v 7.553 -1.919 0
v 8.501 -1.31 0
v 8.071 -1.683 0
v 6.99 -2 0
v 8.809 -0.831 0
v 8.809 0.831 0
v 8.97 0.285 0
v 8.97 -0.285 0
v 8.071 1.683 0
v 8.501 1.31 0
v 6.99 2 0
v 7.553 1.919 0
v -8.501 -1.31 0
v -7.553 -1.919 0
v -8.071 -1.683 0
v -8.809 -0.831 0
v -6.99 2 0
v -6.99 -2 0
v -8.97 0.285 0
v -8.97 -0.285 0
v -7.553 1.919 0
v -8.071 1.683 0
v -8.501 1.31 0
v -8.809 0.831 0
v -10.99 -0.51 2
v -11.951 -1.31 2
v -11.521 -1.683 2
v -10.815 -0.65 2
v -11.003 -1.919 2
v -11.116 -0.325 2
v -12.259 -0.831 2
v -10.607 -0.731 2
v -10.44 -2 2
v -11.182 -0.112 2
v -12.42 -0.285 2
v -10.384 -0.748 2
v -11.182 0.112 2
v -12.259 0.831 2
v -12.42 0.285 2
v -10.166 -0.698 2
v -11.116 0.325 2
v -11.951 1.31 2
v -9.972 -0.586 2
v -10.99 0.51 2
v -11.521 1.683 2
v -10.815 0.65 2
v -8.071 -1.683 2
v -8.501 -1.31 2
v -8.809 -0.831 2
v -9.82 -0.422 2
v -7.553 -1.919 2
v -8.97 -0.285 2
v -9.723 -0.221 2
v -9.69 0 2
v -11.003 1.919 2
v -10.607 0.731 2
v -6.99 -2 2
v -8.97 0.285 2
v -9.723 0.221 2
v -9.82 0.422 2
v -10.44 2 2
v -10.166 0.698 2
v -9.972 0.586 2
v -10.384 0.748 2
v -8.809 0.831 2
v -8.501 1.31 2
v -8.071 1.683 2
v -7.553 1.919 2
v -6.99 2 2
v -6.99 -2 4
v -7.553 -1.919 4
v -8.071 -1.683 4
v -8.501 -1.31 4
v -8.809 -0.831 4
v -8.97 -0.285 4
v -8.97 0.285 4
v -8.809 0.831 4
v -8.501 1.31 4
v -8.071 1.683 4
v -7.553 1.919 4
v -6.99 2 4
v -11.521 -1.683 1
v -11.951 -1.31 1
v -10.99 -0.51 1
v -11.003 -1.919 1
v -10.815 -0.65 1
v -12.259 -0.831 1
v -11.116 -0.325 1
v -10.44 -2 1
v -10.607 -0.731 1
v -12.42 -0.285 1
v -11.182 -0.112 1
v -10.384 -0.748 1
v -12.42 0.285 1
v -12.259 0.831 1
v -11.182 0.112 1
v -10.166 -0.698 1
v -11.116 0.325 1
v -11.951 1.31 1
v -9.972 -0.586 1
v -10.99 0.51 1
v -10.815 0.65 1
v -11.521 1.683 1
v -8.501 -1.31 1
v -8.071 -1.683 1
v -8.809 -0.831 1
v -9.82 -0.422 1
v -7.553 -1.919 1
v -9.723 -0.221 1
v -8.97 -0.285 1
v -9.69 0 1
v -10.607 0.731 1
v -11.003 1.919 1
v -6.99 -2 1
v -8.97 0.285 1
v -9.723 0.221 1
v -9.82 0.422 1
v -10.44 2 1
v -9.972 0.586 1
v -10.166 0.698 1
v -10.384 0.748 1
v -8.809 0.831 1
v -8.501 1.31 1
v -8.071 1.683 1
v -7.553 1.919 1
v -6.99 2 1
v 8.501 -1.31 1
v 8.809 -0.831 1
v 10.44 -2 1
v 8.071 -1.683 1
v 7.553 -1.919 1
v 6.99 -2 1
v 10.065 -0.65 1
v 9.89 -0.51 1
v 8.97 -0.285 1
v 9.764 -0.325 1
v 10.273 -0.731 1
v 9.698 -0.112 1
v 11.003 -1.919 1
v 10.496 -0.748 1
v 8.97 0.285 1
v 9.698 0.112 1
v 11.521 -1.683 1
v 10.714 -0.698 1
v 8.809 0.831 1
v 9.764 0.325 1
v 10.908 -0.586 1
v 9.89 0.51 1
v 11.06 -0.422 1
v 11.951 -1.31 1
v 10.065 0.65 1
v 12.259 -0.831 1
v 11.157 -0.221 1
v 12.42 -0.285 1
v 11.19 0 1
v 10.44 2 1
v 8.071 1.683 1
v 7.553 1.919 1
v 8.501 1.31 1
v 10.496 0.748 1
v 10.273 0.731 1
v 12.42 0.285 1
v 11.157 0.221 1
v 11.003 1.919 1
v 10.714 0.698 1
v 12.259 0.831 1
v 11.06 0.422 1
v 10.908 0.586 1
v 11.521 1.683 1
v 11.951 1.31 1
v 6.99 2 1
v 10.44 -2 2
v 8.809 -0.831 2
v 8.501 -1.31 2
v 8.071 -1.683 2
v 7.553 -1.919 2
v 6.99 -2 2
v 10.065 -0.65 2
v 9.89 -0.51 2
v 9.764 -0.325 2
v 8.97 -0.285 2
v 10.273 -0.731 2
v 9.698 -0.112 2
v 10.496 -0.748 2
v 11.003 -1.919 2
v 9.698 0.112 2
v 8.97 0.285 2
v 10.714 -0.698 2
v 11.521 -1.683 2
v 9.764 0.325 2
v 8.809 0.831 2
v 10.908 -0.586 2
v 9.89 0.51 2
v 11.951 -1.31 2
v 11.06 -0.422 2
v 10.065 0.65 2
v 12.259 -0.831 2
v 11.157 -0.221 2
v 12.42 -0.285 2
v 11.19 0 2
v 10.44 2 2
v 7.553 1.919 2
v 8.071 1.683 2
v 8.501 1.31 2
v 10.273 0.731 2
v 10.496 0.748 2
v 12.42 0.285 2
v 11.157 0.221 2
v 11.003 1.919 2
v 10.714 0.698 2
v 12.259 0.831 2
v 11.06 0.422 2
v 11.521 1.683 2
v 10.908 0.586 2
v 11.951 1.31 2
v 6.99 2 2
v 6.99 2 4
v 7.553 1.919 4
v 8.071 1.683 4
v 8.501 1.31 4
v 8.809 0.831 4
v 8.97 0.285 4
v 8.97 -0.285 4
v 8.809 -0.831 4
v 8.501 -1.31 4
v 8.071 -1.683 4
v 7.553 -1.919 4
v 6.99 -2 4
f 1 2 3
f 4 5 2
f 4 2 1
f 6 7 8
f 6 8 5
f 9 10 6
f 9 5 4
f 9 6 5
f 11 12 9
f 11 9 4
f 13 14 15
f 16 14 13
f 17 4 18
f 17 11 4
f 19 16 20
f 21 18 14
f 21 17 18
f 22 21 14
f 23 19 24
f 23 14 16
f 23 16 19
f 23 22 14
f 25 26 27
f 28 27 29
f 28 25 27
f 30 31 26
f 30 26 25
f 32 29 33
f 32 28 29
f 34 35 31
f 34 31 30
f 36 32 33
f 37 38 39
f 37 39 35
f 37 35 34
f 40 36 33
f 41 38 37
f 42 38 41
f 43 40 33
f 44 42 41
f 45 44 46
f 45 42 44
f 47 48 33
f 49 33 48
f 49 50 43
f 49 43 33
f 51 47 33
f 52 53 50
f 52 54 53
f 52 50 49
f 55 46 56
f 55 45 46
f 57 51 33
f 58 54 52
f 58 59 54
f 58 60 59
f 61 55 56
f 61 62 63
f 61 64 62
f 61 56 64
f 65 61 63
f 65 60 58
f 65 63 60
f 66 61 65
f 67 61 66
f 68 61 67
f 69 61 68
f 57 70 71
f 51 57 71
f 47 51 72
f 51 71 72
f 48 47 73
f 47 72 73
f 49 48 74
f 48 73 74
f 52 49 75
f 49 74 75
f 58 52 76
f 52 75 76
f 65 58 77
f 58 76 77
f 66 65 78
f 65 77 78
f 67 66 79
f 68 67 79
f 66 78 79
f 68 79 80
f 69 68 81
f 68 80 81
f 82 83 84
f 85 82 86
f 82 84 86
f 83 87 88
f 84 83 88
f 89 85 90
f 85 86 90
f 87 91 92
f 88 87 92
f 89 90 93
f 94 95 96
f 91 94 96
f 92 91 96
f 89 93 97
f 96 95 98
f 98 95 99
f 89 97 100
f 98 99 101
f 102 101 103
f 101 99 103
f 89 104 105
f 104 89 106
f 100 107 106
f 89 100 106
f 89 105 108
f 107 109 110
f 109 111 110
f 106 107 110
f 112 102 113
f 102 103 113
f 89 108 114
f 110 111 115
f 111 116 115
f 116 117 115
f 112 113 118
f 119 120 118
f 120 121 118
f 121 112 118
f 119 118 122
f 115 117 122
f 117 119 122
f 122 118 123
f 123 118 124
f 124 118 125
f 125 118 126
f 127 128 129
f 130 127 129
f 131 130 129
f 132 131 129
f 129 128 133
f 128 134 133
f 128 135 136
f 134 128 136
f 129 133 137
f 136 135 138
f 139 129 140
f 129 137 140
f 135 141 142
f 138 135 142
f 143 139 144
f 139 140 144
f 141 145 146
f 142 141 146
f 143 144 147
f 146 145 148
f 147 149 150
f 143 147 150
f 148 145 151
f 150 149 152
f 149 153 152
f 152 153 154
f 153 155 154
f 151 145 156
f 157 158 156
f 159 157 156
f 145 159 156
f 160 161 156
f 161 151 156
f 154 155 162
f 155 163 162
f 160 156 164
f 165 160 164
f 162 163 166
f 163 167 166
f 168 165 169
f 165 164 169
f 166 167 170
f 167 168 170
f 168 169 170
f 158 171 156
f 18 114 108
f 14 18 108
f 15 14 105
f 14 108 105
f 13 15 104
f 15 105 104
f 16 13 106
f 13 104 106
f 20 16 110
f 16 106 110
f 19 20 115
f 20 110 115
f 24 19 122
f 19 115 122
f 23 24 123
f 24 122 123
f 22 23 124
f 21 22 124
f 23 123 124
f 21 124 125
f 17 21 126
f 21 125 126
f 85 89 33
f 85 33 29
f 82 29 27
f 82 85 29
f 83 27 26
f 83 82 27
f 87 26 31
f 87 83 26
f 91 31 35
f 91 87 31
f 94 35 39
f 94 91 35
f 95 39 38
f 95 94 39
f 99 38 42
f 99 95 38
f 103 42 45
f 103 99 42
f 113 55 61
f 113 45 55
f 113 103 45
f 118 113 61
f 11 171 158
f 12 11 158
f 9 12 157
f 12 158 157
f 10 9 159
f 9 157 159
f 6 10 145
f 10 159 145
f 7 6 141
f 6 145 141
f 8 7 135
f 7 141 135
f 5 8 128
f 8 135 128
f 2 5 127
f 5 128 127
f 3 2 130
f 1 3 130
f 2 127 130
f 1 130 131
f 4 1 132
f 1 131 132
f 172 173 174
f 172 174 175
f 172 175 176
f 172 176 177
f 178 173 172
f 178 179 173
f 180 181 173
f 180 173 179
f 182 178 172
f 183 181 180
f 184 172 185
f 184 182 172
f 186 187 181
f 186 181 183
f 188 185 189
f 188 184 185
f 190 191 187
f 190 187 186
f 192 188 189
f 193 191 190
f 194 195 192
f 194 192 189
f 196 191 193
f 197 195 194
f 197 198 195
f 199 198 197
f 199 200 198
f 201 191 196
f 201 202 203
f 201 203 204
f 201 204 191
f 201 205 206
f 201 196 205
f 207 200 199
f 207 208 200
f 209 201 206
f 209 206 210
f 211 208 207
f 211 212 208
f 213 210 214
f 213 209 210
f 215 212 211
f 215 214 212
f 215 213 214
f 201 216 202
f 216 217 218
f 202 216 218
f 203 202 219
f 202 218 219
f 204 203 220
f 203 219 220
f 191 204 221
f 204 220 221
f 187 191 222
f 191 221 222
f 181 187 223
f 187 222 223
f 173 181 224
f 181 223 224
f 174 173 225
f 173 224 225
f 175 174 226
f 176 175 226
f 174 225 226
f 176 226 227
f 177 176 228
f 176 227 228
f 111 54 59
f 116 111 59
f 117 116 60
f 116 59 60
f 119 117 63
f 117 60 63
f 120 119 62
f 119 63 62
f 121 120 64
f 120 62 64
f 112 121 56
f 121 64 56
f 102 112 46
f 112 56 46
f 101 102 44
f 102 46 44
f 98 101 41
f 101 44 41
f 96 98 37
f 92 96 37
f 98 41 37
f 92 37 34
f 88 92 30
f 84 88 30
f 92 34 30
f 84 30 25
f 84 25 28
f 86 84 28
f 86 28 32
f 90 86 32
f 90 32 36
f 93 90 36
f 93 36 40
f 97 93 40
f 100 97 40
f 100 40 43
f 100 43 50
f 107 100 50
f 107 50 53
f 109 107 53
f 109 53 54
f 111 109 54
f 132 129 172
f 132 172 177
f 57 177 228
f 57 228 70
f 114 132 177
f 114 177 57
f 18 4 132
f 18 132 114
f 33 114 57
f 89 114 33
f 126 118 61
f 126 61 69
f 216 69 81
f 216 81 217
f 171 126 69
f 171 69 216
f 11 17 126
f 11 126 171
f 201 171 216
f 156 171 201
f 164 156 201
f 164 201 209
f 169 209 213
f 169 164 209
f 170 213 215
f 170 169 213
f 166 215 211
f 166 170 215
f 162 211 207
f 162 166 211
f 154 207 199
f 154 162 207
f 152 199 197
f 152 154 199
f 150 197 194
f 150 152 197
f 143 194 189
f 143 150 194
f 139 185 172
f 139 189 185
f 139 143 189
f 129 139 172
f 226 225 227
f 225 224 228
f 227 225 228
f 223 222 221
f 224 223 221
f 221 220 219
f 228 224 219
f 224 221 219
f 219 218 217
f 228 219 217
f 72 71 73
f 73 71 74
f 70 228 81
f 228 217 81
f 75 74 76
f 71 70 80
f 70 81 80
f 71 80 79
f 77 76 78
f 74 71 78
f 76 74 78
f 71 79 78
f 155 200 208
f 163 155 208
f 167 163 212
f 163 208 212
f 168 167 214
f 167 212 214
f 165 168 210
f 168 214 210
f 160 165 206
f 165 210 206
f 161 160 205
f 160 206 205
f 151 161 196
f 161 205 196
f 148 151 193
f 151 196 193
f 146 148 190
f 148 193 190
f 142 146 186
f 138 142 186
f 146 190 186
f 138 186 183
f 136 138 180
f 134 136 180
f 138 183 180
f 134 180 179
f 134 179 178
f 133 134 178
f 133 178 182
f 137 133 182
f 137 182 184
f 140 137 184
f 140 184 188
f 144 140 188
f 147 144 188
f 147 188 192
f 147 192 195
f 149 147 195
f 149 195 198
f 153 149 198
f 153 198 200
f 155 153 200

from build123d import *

# Parameters (mm, degrees)
BOSS_EXTRUDE1_DEPTH = 4
SKETCH2_R           = 0.75
CUT_EXTRUDE1_DEPTH  = 4
SKETCH4_R           = 0.75
CUT_EXTRUDE2_DEPTH  = 2
CUT_EXTRUDE3_START  = -3
SKETCH4_3_R         = 0.75
CUT_EXTRUDE3_DEPTH  = 1


with BuildPart() as part:
    # Sketch1 → Boss-Extrude1 (new body)
    with BuildSketch(Plane.XY):
        with BuildLine():
            Line((-10.44, 2), (10.44, 2))
            ThreePointArc((10.44, 2), (12.44, 0), (10.44, -2))
            Line((10.44, -2), (-10.44, -2))
            ThreePointArc((-10.44, -2), (-12.44, 0), (-10.44, 2))
        make_face()
    extrude(amount=BOSS_EXTRUDE1_DEPTH)

    # Sketch2 → Cut-Extrude1 (cut)
    with BuildSketch(Plane.XY.offset(4)):
        with Locations((-10.44, 0)):
            Circle(SKETCH2_R)
        with Locations((10.44, 0)):
            Circle(SKETCH2_R)
    extrude(amount=-CUT_EXTRUDE1_DEPTH, mode=Mode.SUBTRACT)

    # Sketch4 → Cut-Extrude2 (cut)
    # profile 1 of 2: a face of its own
    with BuildSketch(Plane.XY.offset(4)):
        with BuildLine():
            ThreePointArc((-6.99, -2), (-8.99, 0), (-6.99, 2))
            Line((-6.99, 2), (-10.44, 2))
            ThreePointArc((-10.44, 2), (-12.44, 0), (-10.44, -2))
            Line((-10.44, -2), (-6.99, -2))
        make_face()
        with Locations((-10.44, 0)):
            Circle(SKETCH4_R, mode=Mode.SUBTRACT)
    # profile 2 of 2: a face of its own
    with BuildSketch(Plane.XY.offset(4)):
        with BuildLine():
            Line((10.44, 2), (6.99, 2))
            ThreePointArc((6.99, 2), (8.99, 0), (6.99, -2))
            Line((6.99, -2), (10.44, -2))
            ThreePointArc((10.44, -2), (12.44, 0), (10.44, 2))
        make_face()
        with Locations((10.44, 0)):
            Circle(SKETCH4_R, mode=Mode.SUBTRACT)
    extrude(amount=-CUT_EXTRUDE2_DEPTH, mode=Mode.SUBTRACT)

    # Sketch4<3> → Cut-Extrude3 (cut)
    # profile 1 of 2: a face of its own
    with BuildSketch(Plane.XY.offset(4).offset(CUT_EXTRUDE3_START)):
        with BuildLine():
            ThreePointArc((-6.99, -2), (-8.99, 0), (-6.99, 2))
            Line((-6.99, 2), (-10.44, 2))
            ThreePointArc((-10.44, 2), (-12.44, 0), (-10.44, -2))
            Line((-10.44, -2), (-6.99, -2))
        make_face()
        with Locations((-10.44, 0)):
            Circle(SKETCH4_3_R, mode=Mode.SUBTRACT)
    # profile 2 of 2: a face of its own
    with BuildSketch(Plane.XY.offset(4).offset(CUT_EXTRUDE3_START)):
        with BuildLine():
            Line((10.44, 2), (6.99, 2))
            ThreePointArc((6.99, 2), (8.99, 0), (6.99, -2))
            Line((6.99, -2), (10.44, -2))
            ThreePointArc((10.44, -2), (12.44, 0), (10.44, 2))
        make_face()
        with Locations((10.44, 0)):
            Circle(SKETCH4_3_R, mode=Mode.SUBTRACT)
    extrude(amount=-CUT_EXTRUDE3_DEPTH, mode=Mode.SUBTRACT)


solid = part.part
